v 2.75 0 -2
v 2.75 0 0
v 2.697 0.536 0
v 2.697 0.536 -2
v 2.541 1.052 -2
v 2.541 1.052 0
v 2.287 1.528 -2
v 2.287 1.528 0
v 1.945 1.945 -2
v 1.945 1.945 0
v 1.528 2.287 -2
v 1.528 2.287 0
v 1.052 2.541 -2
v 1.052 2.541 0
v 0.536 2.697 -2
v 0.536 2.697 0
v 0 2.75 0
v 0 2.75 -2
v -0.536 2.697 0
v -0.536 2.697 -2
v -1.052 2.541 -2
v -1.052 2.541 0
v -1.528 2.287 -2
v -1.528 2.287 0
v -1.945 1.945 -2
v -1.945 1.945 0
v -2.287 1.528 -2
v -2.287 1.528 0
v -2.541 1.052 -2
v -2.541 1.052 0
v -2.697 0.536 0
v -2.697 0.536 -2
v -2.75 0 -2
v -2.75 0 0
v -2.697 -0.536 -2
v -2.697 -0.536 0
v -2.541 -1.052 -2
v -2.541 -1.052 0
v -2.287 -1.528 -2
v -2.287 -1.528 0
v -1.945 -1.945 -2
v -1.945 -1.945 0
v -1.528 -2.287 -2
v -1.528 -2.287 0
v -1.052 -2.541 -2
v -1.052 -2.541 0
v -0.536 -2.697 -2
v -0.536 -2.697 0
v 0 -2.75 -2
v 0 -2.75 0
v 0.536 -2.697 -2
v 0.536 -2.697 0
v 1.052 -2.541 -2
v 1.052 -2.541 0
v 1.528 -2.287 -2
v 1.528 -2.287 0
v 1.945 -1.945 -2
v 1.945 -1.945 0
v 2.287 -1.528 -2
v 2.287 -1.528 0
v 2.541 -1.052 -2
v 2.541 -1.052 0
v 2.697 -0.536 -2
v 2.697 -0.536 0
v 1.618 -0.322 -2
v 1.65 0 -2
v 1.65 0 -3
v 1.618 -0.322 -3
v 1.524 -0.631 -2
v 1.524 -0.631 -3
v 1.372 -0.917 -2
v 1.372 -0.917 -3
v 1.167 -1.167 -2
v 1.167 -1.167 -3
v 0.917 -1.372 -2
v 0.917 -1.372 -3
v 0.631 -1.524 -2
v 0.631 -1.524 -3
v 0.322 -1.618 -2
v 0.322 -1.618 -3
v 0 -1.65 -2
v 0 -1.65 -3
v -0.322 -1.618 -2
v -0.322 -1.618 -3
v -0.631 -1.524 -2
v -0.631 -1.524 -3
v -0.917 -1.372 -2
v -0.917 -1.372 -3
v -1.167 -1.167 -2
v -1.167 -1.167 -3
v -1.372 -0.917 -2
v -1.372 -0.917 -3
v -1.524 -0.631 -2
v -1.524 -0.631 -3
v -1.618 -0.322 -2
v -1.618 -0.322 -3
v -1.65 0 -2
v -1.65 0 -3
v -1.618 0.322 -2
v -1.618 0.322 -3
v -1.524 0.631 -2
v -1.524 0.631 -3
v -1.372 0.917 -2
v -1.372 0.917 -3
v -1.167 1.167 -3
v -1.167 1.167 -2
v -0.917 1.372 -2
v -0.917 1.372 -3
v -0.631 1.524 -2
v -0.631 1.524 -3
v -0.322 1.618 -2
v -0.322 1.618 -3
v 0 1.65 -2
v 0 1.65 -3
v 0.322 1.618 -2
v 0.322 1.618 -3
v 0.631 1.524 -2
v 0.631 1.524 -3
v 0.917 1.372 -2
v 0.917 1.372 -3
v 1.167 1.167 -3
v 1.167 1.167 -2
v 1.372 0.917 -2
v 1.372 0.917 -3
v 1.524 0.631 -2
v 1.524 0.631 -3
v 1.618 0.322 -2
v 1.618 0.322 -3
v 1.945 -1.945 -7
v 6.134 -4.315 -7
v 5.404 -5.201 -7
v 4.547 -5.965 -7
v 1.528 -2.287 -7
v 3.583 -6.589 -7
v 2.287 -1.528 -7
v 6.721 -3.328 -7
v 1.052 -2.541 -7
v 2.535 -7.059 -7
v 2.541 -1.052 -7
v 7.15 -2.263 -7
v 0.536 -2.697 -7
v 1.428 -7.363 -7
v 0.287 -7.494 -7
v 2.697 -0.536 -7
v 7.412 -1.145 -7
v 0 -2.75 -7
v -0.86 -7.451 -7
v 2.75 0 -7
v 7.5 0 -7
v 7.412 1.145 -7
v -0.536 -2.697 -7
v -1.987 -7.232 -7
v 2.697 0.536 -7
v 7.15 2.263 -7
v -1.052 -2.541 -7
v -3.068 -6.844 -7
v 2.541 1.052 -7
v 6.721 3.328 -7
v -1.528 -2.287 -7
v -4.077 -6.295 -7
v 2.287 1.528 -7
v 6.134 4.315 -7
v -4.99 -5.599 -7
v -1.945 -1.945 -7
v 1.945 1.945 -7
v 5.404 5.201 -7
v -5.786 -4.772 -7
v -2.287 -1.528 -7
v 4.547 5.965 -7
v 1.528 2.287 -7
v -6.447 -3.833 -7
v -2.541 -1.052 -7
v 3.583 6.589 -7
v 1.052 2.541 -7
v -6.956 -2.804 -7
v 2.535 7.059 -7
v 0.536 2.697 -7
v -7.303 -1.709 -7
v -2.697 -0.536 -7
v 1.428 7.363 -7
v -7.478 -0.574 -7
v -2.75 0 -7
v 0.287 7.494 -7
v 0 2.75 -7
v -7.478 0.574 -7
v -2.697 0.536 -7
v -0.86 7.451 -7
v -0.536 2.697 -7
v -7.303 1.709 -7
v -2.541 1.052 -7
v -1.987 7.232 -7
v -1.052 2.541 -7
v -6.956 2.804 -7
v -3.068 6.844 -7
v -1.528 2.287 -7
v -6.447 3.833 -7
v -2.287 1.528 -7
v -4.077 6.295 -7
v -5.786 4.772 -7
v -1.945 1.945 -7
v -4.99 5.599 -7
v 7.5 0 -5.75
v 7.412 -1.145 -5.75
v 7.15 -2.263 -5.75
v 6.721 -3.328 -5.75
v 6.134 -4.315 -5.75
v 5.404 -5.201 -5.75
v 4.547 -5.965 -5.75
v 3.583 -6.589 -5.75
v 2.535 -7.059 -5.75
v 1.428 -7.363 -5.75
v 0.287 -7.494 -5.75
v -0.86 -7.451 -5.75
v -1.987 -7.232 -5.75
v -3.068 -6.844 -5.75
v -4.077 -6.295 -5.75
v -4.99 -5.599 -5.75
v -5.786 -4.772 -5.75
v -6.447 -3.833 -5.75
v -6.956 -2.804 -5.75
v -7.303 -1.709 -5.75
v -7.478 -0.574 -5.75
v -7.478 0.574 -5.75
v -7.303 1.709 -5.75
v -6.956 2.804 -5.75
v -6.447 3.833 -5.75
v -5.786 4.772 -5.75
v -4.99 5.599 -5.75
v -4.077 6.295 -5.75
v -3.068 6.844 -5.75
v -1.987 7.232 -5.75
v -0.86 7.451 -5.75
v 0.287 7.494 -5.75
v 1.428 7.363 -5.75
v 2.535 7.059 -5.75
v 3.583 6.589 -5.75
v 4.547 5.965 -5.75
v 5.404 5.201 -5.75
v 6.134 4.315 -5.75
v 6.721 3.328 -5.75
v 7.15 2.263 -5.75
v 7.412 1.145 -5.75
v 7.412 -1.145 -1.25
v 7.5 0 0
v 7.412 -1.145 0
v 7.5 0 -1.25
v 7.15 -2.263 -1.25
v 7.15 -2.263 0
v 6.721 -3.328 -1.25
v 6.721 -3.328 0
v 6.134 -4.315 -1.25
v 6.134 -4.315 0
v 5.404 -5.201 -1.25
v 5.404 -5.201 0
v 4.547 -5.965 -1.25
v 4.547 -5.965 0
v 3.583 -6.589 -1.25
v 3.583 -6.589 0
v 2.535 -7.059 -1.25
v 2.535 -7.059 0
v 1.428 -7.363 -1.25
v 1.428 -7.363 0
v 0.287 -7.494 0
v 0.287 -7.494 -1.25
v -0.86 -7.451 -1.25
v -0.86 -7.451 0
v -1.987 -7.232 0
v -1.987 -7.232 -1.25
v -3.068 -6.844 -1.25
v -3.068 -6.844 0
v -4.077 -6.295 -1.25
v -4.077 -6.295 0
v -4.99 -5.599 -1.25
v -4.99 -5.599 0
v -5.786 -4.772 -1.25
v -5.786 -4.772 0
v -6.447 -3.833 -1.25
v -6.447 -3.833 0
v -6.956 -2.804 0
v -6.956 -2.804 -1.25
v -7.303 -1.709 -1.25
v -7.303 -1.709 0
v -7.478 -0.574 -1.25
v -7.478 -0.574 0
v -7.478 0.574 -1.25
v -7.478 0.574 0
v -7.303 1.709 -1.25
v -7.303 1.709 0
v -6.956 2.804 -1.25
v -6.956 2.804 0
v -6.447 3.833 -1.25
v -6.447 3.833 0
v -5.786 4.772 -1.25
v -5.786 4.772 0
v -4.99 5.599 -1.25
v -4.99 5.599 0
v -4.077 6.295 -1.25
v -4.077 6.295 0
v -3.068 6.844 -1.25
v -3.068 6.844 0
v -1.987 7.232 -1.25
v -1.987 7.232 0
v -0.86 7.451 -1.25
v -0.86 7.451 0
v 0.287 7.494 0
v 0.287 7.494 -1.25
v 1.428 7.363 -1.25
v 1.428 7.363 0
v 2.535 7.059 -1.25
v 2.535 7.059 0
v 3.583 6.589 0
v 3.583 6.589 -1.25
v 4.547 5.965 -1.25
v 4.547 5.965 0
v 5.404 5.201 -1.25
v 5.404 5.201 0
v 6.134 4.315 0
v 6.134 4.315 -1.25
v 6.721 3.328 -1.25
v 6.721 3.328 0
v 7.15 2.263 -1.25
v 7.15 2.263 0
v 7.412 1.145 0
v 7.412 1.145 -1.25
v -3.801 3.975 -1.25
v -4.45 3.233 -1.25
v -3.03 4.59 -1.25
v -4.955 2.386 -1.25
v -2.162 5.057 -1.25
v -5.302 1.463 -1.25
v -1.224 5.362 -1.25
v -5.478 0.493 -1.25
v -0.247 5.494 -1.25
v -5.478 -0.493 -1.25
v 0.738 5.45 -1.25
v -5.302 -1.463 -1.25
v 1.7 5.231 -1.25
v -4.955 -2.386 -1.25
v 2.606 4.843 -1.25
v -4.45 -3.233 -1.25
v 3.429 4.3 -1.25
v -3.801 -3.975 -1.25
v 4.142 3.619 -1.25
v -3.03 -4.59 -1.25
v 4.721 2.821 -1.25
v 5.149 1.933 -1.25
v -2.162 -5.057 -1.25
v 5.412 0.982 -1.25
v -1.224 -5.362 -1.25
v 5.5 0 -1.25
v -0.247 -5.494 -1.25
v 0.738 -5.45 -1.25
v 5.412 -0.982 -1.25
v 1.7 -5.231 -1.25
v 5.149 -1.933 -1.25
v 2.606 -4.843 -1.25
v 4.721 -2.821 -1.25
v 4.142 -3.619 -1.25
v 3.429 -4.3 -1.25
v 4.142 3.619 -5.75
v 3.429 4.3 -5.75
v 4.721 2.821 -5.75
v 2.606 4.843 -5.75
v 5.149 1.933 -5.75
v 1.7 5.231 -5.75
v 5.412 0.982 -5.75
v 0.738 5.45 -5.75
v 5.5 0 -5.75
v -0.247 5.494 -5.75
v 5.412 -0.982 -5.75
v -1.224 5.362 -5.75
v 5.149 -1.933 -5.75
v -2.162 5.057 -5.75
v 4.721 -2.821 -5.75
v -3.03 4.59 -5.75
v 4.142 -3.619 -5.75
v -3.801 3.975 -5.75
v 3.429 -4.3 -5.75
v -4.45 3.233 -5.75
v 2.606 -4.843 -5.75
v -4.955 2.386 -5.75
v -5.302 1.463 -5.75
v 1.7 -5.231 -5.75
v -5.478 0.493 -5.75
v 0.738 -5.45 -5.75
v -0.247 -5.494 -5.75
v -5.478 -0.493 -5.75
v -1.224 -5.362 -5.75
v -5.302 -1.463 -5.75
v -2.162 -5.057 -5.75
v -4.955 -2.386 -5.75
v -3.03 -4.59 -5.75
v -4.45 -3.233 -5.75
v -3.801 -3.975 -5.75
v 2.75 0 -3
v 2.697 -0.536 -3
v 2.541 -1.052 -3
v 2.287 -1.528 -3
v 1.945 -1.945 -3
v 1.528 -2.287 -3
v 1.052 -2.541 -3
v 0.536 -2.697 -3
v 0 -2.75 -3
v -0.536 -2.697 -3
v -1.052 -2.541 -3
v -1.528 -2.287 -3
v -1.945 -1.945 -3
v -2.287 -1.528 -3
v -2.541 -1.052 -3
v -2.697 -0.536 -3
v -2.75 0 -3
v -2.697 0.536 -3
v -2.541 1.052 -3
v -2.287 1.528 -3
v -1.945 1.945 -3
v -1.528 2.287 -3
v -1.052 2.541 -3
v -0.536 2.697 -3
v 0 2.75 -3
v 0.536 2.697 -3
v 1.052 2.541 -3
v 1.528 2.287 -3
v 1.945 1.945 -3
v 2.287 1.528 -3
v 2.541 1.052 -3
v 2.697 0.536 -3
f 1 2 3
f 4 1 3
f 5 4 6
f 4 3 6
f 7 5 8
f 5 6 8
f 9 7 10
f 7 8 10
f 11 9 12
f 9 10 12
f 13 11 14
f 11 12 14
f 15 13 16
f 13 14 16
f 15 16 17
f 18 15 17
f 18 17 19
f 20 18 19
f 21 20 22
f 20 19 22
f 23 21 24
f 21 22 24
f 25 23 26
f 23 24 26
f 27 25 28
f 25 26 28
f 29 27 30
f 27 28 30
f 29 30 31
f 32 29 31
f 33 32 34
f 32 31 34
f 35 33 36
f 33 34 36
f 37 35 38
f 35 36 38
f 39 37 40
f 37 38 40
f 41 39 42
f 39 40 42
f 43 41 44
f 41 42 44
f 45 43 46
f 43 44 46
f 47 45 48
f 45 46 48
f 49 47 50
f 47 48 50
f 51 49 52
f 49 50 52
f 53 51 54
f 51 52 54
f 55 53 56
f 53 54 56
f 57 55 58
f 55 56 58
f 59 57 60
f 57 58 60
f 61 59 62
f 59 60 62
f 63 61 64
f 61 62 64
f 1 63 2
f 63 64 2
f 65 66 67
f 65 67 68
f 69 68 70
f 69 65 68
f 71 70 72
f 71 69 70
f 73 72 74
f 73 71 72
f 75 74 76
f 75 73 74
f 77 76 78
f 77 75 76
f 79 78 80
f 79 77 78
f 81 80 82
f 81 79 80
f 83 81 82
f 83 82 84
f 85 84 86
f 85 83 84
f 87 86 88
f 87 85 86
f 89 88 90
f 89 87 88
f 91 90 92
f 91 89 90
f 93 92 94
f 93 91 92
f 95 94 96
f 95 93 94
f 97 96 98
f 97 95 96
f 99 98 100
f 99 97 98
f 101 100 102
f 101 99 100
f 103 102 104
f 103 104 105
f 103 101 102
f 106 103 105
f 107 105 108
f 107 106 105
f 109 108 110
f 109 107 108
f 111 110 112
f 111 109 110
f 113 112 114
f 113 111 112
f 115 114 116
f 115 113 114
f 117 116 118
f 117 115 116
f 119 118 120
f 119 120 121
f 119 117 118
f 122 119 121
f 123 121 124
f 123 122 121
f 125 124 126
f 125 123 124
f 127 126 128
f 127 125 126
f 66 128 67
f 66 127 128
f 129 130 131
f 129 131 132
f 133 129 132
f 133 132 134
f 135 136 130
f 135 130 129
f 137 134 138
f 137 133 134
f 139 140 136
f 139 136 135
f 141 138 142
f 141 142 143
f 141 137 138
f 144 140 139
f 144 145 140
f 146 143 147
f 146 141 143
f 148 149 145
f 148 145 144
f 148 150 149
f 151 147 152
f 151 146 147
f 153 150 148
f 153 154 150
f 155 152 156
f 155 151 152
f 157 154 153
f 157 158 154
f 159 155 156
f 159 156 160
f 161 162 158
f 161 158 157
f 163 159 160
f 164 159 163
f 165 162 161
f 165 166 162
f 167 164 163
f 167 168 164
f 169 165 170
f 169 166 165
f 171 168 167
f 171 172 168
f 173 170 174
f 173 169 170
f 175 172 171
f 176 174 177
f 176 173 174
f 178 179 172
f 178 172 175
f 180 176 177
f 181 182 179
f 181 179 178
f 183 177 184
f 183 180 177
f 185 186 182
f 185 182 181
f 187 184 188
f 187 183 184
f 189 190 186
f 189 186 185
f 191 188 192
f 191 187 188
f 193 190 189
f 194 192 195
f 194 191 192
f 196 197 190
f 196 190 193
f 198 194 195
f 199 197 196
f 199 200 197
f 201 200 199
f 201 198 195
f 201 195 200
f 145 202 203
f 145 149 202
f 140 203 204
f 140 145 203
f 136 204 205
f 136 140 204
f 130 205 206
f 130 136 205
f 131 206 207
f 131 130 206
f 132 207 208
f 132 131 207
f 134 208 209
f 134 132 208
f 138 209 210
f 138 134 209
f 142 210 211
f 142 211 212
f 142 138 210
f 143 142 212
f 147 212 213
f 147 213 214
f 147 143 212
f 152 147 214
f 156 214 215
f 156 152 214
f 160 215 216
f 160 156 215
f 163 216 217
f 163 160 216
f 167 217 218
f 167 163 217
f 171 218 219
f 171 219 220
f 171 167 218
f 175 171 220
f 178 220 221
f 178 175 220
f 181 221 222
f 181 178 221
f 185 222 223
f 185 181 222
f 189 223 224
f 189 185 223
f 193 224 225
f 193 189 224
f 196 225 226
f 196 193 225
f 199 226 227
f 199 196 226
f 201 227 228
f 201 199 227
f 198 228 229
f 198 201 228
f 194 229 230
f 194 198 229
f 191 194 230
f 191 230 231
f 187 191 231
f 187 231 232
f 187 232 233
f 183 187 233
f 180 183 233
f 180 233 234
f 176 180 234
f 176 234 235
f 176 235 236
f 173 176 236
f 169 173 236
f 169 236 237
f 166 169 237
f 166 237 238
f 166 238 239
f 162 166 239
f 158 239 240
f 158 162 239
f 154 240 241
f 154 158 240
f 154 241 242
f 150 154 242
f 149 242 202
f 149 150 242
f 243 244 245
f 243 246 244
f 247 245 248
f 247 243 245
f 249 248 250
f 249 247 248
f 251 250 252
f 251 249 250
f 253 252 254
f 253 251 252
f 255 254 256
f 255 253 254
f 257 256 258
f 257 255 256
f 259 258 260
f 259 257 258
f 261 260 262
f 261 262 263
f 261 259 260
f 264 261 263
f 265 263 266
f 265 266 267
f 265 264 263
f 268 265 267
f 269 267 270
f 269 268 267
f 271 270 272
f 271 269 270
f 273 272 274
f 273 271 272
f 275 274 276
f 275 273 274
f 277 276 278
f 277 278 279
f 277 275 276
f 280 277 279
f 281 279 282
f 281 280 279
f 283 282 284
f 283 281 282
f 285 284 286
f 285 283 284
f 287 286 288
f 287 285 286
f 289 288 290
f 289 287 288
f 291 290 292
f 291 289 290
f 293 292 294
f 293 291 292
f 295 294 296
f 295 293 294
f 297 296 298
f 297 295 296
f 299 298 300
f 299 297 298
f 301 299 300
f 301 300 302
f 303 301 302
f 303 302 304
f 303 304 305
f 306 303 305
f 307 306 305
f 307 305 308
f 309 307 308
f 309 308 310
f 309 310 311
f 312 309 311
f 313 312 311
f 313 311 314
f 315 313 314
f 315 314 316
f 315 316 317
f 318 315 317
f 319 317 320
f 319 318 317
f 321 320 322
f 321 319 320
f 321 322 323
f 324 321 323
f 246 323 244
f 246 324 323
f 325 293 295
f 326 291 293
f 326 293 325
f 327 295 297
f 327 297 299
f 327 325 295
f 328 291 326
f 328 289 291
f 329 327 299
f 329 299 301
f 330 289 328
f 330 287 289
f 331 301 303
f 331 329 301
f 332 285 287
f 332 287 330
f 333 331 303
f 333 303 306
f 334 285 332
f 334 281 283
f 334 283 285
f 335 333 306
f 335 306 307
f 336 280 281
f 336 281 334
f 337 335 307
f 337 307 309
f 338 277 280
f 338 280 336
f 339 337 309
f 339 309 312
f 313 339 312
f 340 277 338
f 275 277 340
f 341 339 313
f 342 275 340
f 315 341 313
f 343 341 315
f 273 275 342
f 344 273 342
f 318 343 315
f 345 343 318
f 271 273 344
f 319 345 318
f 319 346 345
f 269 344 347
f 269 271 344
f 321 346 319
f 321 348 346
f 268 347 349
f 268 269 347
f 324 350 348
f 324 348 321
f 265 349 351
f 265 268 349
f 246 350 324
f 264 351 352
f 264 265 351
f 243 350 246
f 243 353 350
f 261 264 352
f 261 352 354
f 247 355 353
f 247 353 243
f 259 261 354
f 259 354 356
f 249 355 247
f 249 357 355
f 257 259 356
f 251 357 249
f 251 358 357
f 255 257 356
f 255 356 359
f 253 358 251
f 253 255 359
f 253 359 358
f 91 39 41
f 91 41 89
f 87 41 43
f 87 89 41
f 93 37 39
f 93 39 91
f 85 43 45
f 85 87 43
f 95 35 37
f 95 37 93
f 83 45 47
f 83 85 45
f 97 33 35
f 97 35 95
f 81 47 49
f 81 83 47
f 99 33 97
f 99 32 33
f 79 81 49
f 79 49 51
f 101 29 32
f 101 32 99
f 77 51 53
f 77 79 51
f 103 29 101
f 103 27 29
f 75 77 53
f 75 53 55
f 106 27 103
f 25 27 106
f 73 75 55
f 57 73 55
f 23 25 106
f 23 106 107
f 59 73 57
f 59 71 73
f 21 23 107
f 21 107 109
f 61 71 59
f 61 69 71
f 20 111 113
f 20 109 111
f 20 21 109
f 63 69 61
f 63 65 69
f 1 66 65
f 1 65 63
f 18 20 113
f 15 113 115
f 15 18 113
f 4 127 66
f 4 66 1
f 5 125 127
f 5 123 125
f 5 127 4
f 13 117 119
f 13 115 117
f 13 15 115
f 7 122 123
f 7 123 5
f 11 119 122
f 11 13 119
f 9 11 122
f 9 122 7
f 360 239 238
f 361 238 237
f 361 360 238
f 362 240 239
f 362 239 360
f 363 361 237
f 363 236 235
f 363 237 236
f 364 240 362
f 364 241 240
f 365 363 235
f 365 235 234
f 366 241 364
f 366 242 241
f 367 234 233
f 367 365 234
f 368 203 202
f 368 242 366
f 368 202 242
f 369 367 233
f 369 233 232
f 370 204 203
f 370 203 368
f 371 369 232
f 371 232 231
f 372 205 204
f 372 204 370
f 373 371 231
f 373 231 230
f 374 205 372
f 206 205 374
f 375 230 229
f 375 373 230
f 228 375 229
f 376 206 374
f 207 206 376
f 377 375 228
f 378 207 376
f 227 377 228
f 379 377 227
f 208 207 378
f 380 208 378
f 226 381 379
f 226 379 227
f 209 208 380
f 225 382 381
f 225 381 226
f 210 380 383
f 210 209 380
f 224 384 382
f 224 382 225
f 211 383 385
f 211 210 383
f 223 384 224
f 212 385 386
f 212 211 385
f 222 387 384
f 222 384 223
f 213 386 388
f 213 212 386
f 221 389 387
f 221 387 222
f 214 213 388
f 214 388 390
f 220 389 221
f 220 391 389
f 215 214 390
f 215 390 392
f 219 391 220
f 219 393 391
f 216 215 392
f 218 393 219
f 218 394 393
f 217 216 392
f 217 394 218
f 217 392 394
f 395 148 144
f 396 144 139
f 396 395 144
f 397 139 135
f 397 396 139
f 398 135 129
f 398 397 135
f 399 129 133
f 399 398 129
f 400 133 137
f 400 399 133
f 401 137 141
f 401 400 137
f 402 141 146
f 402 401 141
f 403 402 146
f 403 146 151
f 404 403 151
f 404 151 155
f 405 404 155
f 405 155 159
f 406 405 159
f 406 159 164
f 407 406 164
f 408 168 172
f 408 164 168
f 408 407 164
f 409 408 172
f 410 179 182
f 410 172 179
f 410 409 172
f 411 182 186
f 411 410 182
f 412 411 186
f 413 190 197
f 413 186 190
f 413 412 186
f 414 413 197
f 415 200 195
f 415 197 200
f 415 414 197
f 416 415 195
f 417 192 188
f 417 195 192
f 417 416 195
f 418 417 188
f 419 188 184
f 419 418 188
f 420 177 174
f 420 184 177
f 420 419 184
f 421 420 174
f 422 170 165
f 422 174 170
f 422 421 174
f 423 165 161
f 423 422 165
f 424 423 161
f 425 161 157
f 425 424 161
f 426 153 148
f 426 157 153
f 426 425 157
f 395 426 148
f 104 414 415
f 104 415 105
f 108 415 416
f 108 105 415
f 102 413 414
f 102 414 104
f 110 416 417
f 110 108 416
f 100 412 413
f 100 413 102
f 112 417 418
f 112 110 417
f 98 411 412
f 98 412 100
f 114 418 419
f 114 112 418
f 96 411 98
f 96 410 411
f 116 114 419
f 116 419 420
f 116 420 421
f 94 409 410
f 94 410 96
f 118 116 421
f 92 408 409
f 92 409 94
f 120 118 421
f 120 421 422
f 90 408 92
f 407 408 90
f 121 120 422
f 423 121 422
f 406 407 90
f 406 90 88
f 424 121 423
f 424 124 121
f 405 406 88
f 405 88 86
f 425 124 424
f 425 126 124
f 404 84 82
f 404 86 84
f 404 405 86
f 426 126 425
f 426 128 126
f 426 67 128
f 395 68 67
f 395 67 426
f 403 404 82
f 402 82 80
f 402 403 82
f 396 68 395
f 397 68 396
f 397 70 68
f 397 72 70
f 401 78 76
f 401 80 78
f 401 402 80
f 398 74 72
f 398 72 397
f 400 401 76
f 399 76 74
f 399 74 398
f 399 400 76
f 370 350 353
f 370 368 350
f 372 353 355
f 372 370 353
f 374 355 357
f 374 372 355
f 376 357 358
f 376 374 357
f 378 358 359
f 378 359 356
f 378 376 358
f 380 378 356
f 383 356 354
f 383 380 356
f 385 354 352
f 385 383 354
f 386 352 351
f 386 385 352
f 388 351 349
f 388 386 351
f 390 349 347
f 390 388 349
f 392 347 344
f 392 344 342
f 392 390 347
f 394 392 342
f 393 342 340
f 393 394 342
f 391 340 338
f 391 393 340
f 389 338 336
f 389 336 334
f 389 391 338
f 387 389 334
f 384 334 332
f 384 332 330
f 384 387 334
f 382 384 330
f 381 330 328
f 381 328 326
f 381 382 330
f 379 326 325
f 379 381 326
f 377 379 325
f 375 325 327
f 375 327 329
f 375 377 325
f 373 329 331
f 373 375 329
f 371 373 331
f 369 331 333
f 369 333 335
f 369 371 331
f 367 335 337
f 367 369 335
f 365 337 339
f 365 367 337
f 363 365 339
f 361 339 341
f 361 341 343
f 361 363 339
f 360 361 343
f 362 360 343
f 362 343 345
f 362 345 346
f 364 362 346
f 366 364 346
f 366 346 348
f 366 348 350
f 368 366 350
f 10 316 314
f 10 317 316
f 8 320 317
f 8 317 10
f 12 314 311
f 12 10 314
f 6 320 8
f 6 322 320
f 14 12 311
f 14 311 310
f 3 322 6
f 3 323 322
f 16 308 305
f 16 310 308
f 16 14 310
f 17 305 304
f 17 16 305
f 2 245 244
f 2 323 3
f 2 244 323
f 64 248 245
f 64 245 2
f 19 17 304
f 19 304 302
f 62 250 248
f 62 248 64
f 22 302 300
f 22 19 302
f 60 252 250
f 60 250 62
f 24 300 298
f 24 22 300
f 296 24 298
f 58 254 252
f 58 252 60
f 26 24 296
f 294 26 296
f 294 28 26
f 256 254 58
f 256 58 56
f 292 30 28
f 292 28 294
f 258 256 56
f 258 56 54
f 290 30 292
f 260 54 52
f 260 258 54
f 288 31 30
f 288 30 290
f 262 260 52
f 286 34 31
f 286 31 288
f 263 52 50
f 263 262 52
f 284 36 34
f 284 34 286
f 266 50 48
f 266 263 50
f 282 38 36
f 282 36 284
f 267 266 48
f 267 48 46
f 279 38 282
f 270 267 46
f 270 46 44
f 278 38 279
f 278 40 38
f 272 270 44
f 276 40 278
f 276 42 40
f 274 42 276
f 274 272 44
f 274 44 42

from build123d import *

# Parameters (mm, degrees)
SKETCH2_R          = 3
CUT_EXTRUDE1_DEPTH = 2
SKETCH3_R          = 2.75
CUT_EXTRUDE2_DEPTH = 2


with BuildPart() as part:
    # Sketch1 → Revolve1 (revolve)
    with BuildSketch(Plane(origin=(0, 0, 0), x_dir=(1, 0, 0), z_dir=(0, 1, 0))):
        Polygon((1.65, 0), (7.5, 0), (7.5, 1.25), (5.5, 1.25), (5.5, 5.75), (7.5, 5.75), (7.5, 7), (3, 7), (3, 9), (2.75, 9), (2.75, 3), (1.65, 3), align=None)
    revolve(axis=Axis((0, 0, 0), (0, 0, -1)))

    # Sketch2 → Cut-Extrude1 (cut)
    with BuildSketch(Plane(origin=(0, 0, -9), x_dir=(-1, 0, 0), z_dir=(0, 0, -1))):
        Circle(SKETCH2_R)
    extrude(amount=-CUT_EXTRUDE1_DEPTH, mode=Mode.SUBTRACT)

    # Sketch3 → Cut-Extrude2 (cut)
    with BuildSketch(Plane.XY):
        Circle(SKETCH3_R)
    extrude(amount=-CUT_EXTRUDE2_DEPTH, mode=Mode.SUBTRACT)


solid = part.part
